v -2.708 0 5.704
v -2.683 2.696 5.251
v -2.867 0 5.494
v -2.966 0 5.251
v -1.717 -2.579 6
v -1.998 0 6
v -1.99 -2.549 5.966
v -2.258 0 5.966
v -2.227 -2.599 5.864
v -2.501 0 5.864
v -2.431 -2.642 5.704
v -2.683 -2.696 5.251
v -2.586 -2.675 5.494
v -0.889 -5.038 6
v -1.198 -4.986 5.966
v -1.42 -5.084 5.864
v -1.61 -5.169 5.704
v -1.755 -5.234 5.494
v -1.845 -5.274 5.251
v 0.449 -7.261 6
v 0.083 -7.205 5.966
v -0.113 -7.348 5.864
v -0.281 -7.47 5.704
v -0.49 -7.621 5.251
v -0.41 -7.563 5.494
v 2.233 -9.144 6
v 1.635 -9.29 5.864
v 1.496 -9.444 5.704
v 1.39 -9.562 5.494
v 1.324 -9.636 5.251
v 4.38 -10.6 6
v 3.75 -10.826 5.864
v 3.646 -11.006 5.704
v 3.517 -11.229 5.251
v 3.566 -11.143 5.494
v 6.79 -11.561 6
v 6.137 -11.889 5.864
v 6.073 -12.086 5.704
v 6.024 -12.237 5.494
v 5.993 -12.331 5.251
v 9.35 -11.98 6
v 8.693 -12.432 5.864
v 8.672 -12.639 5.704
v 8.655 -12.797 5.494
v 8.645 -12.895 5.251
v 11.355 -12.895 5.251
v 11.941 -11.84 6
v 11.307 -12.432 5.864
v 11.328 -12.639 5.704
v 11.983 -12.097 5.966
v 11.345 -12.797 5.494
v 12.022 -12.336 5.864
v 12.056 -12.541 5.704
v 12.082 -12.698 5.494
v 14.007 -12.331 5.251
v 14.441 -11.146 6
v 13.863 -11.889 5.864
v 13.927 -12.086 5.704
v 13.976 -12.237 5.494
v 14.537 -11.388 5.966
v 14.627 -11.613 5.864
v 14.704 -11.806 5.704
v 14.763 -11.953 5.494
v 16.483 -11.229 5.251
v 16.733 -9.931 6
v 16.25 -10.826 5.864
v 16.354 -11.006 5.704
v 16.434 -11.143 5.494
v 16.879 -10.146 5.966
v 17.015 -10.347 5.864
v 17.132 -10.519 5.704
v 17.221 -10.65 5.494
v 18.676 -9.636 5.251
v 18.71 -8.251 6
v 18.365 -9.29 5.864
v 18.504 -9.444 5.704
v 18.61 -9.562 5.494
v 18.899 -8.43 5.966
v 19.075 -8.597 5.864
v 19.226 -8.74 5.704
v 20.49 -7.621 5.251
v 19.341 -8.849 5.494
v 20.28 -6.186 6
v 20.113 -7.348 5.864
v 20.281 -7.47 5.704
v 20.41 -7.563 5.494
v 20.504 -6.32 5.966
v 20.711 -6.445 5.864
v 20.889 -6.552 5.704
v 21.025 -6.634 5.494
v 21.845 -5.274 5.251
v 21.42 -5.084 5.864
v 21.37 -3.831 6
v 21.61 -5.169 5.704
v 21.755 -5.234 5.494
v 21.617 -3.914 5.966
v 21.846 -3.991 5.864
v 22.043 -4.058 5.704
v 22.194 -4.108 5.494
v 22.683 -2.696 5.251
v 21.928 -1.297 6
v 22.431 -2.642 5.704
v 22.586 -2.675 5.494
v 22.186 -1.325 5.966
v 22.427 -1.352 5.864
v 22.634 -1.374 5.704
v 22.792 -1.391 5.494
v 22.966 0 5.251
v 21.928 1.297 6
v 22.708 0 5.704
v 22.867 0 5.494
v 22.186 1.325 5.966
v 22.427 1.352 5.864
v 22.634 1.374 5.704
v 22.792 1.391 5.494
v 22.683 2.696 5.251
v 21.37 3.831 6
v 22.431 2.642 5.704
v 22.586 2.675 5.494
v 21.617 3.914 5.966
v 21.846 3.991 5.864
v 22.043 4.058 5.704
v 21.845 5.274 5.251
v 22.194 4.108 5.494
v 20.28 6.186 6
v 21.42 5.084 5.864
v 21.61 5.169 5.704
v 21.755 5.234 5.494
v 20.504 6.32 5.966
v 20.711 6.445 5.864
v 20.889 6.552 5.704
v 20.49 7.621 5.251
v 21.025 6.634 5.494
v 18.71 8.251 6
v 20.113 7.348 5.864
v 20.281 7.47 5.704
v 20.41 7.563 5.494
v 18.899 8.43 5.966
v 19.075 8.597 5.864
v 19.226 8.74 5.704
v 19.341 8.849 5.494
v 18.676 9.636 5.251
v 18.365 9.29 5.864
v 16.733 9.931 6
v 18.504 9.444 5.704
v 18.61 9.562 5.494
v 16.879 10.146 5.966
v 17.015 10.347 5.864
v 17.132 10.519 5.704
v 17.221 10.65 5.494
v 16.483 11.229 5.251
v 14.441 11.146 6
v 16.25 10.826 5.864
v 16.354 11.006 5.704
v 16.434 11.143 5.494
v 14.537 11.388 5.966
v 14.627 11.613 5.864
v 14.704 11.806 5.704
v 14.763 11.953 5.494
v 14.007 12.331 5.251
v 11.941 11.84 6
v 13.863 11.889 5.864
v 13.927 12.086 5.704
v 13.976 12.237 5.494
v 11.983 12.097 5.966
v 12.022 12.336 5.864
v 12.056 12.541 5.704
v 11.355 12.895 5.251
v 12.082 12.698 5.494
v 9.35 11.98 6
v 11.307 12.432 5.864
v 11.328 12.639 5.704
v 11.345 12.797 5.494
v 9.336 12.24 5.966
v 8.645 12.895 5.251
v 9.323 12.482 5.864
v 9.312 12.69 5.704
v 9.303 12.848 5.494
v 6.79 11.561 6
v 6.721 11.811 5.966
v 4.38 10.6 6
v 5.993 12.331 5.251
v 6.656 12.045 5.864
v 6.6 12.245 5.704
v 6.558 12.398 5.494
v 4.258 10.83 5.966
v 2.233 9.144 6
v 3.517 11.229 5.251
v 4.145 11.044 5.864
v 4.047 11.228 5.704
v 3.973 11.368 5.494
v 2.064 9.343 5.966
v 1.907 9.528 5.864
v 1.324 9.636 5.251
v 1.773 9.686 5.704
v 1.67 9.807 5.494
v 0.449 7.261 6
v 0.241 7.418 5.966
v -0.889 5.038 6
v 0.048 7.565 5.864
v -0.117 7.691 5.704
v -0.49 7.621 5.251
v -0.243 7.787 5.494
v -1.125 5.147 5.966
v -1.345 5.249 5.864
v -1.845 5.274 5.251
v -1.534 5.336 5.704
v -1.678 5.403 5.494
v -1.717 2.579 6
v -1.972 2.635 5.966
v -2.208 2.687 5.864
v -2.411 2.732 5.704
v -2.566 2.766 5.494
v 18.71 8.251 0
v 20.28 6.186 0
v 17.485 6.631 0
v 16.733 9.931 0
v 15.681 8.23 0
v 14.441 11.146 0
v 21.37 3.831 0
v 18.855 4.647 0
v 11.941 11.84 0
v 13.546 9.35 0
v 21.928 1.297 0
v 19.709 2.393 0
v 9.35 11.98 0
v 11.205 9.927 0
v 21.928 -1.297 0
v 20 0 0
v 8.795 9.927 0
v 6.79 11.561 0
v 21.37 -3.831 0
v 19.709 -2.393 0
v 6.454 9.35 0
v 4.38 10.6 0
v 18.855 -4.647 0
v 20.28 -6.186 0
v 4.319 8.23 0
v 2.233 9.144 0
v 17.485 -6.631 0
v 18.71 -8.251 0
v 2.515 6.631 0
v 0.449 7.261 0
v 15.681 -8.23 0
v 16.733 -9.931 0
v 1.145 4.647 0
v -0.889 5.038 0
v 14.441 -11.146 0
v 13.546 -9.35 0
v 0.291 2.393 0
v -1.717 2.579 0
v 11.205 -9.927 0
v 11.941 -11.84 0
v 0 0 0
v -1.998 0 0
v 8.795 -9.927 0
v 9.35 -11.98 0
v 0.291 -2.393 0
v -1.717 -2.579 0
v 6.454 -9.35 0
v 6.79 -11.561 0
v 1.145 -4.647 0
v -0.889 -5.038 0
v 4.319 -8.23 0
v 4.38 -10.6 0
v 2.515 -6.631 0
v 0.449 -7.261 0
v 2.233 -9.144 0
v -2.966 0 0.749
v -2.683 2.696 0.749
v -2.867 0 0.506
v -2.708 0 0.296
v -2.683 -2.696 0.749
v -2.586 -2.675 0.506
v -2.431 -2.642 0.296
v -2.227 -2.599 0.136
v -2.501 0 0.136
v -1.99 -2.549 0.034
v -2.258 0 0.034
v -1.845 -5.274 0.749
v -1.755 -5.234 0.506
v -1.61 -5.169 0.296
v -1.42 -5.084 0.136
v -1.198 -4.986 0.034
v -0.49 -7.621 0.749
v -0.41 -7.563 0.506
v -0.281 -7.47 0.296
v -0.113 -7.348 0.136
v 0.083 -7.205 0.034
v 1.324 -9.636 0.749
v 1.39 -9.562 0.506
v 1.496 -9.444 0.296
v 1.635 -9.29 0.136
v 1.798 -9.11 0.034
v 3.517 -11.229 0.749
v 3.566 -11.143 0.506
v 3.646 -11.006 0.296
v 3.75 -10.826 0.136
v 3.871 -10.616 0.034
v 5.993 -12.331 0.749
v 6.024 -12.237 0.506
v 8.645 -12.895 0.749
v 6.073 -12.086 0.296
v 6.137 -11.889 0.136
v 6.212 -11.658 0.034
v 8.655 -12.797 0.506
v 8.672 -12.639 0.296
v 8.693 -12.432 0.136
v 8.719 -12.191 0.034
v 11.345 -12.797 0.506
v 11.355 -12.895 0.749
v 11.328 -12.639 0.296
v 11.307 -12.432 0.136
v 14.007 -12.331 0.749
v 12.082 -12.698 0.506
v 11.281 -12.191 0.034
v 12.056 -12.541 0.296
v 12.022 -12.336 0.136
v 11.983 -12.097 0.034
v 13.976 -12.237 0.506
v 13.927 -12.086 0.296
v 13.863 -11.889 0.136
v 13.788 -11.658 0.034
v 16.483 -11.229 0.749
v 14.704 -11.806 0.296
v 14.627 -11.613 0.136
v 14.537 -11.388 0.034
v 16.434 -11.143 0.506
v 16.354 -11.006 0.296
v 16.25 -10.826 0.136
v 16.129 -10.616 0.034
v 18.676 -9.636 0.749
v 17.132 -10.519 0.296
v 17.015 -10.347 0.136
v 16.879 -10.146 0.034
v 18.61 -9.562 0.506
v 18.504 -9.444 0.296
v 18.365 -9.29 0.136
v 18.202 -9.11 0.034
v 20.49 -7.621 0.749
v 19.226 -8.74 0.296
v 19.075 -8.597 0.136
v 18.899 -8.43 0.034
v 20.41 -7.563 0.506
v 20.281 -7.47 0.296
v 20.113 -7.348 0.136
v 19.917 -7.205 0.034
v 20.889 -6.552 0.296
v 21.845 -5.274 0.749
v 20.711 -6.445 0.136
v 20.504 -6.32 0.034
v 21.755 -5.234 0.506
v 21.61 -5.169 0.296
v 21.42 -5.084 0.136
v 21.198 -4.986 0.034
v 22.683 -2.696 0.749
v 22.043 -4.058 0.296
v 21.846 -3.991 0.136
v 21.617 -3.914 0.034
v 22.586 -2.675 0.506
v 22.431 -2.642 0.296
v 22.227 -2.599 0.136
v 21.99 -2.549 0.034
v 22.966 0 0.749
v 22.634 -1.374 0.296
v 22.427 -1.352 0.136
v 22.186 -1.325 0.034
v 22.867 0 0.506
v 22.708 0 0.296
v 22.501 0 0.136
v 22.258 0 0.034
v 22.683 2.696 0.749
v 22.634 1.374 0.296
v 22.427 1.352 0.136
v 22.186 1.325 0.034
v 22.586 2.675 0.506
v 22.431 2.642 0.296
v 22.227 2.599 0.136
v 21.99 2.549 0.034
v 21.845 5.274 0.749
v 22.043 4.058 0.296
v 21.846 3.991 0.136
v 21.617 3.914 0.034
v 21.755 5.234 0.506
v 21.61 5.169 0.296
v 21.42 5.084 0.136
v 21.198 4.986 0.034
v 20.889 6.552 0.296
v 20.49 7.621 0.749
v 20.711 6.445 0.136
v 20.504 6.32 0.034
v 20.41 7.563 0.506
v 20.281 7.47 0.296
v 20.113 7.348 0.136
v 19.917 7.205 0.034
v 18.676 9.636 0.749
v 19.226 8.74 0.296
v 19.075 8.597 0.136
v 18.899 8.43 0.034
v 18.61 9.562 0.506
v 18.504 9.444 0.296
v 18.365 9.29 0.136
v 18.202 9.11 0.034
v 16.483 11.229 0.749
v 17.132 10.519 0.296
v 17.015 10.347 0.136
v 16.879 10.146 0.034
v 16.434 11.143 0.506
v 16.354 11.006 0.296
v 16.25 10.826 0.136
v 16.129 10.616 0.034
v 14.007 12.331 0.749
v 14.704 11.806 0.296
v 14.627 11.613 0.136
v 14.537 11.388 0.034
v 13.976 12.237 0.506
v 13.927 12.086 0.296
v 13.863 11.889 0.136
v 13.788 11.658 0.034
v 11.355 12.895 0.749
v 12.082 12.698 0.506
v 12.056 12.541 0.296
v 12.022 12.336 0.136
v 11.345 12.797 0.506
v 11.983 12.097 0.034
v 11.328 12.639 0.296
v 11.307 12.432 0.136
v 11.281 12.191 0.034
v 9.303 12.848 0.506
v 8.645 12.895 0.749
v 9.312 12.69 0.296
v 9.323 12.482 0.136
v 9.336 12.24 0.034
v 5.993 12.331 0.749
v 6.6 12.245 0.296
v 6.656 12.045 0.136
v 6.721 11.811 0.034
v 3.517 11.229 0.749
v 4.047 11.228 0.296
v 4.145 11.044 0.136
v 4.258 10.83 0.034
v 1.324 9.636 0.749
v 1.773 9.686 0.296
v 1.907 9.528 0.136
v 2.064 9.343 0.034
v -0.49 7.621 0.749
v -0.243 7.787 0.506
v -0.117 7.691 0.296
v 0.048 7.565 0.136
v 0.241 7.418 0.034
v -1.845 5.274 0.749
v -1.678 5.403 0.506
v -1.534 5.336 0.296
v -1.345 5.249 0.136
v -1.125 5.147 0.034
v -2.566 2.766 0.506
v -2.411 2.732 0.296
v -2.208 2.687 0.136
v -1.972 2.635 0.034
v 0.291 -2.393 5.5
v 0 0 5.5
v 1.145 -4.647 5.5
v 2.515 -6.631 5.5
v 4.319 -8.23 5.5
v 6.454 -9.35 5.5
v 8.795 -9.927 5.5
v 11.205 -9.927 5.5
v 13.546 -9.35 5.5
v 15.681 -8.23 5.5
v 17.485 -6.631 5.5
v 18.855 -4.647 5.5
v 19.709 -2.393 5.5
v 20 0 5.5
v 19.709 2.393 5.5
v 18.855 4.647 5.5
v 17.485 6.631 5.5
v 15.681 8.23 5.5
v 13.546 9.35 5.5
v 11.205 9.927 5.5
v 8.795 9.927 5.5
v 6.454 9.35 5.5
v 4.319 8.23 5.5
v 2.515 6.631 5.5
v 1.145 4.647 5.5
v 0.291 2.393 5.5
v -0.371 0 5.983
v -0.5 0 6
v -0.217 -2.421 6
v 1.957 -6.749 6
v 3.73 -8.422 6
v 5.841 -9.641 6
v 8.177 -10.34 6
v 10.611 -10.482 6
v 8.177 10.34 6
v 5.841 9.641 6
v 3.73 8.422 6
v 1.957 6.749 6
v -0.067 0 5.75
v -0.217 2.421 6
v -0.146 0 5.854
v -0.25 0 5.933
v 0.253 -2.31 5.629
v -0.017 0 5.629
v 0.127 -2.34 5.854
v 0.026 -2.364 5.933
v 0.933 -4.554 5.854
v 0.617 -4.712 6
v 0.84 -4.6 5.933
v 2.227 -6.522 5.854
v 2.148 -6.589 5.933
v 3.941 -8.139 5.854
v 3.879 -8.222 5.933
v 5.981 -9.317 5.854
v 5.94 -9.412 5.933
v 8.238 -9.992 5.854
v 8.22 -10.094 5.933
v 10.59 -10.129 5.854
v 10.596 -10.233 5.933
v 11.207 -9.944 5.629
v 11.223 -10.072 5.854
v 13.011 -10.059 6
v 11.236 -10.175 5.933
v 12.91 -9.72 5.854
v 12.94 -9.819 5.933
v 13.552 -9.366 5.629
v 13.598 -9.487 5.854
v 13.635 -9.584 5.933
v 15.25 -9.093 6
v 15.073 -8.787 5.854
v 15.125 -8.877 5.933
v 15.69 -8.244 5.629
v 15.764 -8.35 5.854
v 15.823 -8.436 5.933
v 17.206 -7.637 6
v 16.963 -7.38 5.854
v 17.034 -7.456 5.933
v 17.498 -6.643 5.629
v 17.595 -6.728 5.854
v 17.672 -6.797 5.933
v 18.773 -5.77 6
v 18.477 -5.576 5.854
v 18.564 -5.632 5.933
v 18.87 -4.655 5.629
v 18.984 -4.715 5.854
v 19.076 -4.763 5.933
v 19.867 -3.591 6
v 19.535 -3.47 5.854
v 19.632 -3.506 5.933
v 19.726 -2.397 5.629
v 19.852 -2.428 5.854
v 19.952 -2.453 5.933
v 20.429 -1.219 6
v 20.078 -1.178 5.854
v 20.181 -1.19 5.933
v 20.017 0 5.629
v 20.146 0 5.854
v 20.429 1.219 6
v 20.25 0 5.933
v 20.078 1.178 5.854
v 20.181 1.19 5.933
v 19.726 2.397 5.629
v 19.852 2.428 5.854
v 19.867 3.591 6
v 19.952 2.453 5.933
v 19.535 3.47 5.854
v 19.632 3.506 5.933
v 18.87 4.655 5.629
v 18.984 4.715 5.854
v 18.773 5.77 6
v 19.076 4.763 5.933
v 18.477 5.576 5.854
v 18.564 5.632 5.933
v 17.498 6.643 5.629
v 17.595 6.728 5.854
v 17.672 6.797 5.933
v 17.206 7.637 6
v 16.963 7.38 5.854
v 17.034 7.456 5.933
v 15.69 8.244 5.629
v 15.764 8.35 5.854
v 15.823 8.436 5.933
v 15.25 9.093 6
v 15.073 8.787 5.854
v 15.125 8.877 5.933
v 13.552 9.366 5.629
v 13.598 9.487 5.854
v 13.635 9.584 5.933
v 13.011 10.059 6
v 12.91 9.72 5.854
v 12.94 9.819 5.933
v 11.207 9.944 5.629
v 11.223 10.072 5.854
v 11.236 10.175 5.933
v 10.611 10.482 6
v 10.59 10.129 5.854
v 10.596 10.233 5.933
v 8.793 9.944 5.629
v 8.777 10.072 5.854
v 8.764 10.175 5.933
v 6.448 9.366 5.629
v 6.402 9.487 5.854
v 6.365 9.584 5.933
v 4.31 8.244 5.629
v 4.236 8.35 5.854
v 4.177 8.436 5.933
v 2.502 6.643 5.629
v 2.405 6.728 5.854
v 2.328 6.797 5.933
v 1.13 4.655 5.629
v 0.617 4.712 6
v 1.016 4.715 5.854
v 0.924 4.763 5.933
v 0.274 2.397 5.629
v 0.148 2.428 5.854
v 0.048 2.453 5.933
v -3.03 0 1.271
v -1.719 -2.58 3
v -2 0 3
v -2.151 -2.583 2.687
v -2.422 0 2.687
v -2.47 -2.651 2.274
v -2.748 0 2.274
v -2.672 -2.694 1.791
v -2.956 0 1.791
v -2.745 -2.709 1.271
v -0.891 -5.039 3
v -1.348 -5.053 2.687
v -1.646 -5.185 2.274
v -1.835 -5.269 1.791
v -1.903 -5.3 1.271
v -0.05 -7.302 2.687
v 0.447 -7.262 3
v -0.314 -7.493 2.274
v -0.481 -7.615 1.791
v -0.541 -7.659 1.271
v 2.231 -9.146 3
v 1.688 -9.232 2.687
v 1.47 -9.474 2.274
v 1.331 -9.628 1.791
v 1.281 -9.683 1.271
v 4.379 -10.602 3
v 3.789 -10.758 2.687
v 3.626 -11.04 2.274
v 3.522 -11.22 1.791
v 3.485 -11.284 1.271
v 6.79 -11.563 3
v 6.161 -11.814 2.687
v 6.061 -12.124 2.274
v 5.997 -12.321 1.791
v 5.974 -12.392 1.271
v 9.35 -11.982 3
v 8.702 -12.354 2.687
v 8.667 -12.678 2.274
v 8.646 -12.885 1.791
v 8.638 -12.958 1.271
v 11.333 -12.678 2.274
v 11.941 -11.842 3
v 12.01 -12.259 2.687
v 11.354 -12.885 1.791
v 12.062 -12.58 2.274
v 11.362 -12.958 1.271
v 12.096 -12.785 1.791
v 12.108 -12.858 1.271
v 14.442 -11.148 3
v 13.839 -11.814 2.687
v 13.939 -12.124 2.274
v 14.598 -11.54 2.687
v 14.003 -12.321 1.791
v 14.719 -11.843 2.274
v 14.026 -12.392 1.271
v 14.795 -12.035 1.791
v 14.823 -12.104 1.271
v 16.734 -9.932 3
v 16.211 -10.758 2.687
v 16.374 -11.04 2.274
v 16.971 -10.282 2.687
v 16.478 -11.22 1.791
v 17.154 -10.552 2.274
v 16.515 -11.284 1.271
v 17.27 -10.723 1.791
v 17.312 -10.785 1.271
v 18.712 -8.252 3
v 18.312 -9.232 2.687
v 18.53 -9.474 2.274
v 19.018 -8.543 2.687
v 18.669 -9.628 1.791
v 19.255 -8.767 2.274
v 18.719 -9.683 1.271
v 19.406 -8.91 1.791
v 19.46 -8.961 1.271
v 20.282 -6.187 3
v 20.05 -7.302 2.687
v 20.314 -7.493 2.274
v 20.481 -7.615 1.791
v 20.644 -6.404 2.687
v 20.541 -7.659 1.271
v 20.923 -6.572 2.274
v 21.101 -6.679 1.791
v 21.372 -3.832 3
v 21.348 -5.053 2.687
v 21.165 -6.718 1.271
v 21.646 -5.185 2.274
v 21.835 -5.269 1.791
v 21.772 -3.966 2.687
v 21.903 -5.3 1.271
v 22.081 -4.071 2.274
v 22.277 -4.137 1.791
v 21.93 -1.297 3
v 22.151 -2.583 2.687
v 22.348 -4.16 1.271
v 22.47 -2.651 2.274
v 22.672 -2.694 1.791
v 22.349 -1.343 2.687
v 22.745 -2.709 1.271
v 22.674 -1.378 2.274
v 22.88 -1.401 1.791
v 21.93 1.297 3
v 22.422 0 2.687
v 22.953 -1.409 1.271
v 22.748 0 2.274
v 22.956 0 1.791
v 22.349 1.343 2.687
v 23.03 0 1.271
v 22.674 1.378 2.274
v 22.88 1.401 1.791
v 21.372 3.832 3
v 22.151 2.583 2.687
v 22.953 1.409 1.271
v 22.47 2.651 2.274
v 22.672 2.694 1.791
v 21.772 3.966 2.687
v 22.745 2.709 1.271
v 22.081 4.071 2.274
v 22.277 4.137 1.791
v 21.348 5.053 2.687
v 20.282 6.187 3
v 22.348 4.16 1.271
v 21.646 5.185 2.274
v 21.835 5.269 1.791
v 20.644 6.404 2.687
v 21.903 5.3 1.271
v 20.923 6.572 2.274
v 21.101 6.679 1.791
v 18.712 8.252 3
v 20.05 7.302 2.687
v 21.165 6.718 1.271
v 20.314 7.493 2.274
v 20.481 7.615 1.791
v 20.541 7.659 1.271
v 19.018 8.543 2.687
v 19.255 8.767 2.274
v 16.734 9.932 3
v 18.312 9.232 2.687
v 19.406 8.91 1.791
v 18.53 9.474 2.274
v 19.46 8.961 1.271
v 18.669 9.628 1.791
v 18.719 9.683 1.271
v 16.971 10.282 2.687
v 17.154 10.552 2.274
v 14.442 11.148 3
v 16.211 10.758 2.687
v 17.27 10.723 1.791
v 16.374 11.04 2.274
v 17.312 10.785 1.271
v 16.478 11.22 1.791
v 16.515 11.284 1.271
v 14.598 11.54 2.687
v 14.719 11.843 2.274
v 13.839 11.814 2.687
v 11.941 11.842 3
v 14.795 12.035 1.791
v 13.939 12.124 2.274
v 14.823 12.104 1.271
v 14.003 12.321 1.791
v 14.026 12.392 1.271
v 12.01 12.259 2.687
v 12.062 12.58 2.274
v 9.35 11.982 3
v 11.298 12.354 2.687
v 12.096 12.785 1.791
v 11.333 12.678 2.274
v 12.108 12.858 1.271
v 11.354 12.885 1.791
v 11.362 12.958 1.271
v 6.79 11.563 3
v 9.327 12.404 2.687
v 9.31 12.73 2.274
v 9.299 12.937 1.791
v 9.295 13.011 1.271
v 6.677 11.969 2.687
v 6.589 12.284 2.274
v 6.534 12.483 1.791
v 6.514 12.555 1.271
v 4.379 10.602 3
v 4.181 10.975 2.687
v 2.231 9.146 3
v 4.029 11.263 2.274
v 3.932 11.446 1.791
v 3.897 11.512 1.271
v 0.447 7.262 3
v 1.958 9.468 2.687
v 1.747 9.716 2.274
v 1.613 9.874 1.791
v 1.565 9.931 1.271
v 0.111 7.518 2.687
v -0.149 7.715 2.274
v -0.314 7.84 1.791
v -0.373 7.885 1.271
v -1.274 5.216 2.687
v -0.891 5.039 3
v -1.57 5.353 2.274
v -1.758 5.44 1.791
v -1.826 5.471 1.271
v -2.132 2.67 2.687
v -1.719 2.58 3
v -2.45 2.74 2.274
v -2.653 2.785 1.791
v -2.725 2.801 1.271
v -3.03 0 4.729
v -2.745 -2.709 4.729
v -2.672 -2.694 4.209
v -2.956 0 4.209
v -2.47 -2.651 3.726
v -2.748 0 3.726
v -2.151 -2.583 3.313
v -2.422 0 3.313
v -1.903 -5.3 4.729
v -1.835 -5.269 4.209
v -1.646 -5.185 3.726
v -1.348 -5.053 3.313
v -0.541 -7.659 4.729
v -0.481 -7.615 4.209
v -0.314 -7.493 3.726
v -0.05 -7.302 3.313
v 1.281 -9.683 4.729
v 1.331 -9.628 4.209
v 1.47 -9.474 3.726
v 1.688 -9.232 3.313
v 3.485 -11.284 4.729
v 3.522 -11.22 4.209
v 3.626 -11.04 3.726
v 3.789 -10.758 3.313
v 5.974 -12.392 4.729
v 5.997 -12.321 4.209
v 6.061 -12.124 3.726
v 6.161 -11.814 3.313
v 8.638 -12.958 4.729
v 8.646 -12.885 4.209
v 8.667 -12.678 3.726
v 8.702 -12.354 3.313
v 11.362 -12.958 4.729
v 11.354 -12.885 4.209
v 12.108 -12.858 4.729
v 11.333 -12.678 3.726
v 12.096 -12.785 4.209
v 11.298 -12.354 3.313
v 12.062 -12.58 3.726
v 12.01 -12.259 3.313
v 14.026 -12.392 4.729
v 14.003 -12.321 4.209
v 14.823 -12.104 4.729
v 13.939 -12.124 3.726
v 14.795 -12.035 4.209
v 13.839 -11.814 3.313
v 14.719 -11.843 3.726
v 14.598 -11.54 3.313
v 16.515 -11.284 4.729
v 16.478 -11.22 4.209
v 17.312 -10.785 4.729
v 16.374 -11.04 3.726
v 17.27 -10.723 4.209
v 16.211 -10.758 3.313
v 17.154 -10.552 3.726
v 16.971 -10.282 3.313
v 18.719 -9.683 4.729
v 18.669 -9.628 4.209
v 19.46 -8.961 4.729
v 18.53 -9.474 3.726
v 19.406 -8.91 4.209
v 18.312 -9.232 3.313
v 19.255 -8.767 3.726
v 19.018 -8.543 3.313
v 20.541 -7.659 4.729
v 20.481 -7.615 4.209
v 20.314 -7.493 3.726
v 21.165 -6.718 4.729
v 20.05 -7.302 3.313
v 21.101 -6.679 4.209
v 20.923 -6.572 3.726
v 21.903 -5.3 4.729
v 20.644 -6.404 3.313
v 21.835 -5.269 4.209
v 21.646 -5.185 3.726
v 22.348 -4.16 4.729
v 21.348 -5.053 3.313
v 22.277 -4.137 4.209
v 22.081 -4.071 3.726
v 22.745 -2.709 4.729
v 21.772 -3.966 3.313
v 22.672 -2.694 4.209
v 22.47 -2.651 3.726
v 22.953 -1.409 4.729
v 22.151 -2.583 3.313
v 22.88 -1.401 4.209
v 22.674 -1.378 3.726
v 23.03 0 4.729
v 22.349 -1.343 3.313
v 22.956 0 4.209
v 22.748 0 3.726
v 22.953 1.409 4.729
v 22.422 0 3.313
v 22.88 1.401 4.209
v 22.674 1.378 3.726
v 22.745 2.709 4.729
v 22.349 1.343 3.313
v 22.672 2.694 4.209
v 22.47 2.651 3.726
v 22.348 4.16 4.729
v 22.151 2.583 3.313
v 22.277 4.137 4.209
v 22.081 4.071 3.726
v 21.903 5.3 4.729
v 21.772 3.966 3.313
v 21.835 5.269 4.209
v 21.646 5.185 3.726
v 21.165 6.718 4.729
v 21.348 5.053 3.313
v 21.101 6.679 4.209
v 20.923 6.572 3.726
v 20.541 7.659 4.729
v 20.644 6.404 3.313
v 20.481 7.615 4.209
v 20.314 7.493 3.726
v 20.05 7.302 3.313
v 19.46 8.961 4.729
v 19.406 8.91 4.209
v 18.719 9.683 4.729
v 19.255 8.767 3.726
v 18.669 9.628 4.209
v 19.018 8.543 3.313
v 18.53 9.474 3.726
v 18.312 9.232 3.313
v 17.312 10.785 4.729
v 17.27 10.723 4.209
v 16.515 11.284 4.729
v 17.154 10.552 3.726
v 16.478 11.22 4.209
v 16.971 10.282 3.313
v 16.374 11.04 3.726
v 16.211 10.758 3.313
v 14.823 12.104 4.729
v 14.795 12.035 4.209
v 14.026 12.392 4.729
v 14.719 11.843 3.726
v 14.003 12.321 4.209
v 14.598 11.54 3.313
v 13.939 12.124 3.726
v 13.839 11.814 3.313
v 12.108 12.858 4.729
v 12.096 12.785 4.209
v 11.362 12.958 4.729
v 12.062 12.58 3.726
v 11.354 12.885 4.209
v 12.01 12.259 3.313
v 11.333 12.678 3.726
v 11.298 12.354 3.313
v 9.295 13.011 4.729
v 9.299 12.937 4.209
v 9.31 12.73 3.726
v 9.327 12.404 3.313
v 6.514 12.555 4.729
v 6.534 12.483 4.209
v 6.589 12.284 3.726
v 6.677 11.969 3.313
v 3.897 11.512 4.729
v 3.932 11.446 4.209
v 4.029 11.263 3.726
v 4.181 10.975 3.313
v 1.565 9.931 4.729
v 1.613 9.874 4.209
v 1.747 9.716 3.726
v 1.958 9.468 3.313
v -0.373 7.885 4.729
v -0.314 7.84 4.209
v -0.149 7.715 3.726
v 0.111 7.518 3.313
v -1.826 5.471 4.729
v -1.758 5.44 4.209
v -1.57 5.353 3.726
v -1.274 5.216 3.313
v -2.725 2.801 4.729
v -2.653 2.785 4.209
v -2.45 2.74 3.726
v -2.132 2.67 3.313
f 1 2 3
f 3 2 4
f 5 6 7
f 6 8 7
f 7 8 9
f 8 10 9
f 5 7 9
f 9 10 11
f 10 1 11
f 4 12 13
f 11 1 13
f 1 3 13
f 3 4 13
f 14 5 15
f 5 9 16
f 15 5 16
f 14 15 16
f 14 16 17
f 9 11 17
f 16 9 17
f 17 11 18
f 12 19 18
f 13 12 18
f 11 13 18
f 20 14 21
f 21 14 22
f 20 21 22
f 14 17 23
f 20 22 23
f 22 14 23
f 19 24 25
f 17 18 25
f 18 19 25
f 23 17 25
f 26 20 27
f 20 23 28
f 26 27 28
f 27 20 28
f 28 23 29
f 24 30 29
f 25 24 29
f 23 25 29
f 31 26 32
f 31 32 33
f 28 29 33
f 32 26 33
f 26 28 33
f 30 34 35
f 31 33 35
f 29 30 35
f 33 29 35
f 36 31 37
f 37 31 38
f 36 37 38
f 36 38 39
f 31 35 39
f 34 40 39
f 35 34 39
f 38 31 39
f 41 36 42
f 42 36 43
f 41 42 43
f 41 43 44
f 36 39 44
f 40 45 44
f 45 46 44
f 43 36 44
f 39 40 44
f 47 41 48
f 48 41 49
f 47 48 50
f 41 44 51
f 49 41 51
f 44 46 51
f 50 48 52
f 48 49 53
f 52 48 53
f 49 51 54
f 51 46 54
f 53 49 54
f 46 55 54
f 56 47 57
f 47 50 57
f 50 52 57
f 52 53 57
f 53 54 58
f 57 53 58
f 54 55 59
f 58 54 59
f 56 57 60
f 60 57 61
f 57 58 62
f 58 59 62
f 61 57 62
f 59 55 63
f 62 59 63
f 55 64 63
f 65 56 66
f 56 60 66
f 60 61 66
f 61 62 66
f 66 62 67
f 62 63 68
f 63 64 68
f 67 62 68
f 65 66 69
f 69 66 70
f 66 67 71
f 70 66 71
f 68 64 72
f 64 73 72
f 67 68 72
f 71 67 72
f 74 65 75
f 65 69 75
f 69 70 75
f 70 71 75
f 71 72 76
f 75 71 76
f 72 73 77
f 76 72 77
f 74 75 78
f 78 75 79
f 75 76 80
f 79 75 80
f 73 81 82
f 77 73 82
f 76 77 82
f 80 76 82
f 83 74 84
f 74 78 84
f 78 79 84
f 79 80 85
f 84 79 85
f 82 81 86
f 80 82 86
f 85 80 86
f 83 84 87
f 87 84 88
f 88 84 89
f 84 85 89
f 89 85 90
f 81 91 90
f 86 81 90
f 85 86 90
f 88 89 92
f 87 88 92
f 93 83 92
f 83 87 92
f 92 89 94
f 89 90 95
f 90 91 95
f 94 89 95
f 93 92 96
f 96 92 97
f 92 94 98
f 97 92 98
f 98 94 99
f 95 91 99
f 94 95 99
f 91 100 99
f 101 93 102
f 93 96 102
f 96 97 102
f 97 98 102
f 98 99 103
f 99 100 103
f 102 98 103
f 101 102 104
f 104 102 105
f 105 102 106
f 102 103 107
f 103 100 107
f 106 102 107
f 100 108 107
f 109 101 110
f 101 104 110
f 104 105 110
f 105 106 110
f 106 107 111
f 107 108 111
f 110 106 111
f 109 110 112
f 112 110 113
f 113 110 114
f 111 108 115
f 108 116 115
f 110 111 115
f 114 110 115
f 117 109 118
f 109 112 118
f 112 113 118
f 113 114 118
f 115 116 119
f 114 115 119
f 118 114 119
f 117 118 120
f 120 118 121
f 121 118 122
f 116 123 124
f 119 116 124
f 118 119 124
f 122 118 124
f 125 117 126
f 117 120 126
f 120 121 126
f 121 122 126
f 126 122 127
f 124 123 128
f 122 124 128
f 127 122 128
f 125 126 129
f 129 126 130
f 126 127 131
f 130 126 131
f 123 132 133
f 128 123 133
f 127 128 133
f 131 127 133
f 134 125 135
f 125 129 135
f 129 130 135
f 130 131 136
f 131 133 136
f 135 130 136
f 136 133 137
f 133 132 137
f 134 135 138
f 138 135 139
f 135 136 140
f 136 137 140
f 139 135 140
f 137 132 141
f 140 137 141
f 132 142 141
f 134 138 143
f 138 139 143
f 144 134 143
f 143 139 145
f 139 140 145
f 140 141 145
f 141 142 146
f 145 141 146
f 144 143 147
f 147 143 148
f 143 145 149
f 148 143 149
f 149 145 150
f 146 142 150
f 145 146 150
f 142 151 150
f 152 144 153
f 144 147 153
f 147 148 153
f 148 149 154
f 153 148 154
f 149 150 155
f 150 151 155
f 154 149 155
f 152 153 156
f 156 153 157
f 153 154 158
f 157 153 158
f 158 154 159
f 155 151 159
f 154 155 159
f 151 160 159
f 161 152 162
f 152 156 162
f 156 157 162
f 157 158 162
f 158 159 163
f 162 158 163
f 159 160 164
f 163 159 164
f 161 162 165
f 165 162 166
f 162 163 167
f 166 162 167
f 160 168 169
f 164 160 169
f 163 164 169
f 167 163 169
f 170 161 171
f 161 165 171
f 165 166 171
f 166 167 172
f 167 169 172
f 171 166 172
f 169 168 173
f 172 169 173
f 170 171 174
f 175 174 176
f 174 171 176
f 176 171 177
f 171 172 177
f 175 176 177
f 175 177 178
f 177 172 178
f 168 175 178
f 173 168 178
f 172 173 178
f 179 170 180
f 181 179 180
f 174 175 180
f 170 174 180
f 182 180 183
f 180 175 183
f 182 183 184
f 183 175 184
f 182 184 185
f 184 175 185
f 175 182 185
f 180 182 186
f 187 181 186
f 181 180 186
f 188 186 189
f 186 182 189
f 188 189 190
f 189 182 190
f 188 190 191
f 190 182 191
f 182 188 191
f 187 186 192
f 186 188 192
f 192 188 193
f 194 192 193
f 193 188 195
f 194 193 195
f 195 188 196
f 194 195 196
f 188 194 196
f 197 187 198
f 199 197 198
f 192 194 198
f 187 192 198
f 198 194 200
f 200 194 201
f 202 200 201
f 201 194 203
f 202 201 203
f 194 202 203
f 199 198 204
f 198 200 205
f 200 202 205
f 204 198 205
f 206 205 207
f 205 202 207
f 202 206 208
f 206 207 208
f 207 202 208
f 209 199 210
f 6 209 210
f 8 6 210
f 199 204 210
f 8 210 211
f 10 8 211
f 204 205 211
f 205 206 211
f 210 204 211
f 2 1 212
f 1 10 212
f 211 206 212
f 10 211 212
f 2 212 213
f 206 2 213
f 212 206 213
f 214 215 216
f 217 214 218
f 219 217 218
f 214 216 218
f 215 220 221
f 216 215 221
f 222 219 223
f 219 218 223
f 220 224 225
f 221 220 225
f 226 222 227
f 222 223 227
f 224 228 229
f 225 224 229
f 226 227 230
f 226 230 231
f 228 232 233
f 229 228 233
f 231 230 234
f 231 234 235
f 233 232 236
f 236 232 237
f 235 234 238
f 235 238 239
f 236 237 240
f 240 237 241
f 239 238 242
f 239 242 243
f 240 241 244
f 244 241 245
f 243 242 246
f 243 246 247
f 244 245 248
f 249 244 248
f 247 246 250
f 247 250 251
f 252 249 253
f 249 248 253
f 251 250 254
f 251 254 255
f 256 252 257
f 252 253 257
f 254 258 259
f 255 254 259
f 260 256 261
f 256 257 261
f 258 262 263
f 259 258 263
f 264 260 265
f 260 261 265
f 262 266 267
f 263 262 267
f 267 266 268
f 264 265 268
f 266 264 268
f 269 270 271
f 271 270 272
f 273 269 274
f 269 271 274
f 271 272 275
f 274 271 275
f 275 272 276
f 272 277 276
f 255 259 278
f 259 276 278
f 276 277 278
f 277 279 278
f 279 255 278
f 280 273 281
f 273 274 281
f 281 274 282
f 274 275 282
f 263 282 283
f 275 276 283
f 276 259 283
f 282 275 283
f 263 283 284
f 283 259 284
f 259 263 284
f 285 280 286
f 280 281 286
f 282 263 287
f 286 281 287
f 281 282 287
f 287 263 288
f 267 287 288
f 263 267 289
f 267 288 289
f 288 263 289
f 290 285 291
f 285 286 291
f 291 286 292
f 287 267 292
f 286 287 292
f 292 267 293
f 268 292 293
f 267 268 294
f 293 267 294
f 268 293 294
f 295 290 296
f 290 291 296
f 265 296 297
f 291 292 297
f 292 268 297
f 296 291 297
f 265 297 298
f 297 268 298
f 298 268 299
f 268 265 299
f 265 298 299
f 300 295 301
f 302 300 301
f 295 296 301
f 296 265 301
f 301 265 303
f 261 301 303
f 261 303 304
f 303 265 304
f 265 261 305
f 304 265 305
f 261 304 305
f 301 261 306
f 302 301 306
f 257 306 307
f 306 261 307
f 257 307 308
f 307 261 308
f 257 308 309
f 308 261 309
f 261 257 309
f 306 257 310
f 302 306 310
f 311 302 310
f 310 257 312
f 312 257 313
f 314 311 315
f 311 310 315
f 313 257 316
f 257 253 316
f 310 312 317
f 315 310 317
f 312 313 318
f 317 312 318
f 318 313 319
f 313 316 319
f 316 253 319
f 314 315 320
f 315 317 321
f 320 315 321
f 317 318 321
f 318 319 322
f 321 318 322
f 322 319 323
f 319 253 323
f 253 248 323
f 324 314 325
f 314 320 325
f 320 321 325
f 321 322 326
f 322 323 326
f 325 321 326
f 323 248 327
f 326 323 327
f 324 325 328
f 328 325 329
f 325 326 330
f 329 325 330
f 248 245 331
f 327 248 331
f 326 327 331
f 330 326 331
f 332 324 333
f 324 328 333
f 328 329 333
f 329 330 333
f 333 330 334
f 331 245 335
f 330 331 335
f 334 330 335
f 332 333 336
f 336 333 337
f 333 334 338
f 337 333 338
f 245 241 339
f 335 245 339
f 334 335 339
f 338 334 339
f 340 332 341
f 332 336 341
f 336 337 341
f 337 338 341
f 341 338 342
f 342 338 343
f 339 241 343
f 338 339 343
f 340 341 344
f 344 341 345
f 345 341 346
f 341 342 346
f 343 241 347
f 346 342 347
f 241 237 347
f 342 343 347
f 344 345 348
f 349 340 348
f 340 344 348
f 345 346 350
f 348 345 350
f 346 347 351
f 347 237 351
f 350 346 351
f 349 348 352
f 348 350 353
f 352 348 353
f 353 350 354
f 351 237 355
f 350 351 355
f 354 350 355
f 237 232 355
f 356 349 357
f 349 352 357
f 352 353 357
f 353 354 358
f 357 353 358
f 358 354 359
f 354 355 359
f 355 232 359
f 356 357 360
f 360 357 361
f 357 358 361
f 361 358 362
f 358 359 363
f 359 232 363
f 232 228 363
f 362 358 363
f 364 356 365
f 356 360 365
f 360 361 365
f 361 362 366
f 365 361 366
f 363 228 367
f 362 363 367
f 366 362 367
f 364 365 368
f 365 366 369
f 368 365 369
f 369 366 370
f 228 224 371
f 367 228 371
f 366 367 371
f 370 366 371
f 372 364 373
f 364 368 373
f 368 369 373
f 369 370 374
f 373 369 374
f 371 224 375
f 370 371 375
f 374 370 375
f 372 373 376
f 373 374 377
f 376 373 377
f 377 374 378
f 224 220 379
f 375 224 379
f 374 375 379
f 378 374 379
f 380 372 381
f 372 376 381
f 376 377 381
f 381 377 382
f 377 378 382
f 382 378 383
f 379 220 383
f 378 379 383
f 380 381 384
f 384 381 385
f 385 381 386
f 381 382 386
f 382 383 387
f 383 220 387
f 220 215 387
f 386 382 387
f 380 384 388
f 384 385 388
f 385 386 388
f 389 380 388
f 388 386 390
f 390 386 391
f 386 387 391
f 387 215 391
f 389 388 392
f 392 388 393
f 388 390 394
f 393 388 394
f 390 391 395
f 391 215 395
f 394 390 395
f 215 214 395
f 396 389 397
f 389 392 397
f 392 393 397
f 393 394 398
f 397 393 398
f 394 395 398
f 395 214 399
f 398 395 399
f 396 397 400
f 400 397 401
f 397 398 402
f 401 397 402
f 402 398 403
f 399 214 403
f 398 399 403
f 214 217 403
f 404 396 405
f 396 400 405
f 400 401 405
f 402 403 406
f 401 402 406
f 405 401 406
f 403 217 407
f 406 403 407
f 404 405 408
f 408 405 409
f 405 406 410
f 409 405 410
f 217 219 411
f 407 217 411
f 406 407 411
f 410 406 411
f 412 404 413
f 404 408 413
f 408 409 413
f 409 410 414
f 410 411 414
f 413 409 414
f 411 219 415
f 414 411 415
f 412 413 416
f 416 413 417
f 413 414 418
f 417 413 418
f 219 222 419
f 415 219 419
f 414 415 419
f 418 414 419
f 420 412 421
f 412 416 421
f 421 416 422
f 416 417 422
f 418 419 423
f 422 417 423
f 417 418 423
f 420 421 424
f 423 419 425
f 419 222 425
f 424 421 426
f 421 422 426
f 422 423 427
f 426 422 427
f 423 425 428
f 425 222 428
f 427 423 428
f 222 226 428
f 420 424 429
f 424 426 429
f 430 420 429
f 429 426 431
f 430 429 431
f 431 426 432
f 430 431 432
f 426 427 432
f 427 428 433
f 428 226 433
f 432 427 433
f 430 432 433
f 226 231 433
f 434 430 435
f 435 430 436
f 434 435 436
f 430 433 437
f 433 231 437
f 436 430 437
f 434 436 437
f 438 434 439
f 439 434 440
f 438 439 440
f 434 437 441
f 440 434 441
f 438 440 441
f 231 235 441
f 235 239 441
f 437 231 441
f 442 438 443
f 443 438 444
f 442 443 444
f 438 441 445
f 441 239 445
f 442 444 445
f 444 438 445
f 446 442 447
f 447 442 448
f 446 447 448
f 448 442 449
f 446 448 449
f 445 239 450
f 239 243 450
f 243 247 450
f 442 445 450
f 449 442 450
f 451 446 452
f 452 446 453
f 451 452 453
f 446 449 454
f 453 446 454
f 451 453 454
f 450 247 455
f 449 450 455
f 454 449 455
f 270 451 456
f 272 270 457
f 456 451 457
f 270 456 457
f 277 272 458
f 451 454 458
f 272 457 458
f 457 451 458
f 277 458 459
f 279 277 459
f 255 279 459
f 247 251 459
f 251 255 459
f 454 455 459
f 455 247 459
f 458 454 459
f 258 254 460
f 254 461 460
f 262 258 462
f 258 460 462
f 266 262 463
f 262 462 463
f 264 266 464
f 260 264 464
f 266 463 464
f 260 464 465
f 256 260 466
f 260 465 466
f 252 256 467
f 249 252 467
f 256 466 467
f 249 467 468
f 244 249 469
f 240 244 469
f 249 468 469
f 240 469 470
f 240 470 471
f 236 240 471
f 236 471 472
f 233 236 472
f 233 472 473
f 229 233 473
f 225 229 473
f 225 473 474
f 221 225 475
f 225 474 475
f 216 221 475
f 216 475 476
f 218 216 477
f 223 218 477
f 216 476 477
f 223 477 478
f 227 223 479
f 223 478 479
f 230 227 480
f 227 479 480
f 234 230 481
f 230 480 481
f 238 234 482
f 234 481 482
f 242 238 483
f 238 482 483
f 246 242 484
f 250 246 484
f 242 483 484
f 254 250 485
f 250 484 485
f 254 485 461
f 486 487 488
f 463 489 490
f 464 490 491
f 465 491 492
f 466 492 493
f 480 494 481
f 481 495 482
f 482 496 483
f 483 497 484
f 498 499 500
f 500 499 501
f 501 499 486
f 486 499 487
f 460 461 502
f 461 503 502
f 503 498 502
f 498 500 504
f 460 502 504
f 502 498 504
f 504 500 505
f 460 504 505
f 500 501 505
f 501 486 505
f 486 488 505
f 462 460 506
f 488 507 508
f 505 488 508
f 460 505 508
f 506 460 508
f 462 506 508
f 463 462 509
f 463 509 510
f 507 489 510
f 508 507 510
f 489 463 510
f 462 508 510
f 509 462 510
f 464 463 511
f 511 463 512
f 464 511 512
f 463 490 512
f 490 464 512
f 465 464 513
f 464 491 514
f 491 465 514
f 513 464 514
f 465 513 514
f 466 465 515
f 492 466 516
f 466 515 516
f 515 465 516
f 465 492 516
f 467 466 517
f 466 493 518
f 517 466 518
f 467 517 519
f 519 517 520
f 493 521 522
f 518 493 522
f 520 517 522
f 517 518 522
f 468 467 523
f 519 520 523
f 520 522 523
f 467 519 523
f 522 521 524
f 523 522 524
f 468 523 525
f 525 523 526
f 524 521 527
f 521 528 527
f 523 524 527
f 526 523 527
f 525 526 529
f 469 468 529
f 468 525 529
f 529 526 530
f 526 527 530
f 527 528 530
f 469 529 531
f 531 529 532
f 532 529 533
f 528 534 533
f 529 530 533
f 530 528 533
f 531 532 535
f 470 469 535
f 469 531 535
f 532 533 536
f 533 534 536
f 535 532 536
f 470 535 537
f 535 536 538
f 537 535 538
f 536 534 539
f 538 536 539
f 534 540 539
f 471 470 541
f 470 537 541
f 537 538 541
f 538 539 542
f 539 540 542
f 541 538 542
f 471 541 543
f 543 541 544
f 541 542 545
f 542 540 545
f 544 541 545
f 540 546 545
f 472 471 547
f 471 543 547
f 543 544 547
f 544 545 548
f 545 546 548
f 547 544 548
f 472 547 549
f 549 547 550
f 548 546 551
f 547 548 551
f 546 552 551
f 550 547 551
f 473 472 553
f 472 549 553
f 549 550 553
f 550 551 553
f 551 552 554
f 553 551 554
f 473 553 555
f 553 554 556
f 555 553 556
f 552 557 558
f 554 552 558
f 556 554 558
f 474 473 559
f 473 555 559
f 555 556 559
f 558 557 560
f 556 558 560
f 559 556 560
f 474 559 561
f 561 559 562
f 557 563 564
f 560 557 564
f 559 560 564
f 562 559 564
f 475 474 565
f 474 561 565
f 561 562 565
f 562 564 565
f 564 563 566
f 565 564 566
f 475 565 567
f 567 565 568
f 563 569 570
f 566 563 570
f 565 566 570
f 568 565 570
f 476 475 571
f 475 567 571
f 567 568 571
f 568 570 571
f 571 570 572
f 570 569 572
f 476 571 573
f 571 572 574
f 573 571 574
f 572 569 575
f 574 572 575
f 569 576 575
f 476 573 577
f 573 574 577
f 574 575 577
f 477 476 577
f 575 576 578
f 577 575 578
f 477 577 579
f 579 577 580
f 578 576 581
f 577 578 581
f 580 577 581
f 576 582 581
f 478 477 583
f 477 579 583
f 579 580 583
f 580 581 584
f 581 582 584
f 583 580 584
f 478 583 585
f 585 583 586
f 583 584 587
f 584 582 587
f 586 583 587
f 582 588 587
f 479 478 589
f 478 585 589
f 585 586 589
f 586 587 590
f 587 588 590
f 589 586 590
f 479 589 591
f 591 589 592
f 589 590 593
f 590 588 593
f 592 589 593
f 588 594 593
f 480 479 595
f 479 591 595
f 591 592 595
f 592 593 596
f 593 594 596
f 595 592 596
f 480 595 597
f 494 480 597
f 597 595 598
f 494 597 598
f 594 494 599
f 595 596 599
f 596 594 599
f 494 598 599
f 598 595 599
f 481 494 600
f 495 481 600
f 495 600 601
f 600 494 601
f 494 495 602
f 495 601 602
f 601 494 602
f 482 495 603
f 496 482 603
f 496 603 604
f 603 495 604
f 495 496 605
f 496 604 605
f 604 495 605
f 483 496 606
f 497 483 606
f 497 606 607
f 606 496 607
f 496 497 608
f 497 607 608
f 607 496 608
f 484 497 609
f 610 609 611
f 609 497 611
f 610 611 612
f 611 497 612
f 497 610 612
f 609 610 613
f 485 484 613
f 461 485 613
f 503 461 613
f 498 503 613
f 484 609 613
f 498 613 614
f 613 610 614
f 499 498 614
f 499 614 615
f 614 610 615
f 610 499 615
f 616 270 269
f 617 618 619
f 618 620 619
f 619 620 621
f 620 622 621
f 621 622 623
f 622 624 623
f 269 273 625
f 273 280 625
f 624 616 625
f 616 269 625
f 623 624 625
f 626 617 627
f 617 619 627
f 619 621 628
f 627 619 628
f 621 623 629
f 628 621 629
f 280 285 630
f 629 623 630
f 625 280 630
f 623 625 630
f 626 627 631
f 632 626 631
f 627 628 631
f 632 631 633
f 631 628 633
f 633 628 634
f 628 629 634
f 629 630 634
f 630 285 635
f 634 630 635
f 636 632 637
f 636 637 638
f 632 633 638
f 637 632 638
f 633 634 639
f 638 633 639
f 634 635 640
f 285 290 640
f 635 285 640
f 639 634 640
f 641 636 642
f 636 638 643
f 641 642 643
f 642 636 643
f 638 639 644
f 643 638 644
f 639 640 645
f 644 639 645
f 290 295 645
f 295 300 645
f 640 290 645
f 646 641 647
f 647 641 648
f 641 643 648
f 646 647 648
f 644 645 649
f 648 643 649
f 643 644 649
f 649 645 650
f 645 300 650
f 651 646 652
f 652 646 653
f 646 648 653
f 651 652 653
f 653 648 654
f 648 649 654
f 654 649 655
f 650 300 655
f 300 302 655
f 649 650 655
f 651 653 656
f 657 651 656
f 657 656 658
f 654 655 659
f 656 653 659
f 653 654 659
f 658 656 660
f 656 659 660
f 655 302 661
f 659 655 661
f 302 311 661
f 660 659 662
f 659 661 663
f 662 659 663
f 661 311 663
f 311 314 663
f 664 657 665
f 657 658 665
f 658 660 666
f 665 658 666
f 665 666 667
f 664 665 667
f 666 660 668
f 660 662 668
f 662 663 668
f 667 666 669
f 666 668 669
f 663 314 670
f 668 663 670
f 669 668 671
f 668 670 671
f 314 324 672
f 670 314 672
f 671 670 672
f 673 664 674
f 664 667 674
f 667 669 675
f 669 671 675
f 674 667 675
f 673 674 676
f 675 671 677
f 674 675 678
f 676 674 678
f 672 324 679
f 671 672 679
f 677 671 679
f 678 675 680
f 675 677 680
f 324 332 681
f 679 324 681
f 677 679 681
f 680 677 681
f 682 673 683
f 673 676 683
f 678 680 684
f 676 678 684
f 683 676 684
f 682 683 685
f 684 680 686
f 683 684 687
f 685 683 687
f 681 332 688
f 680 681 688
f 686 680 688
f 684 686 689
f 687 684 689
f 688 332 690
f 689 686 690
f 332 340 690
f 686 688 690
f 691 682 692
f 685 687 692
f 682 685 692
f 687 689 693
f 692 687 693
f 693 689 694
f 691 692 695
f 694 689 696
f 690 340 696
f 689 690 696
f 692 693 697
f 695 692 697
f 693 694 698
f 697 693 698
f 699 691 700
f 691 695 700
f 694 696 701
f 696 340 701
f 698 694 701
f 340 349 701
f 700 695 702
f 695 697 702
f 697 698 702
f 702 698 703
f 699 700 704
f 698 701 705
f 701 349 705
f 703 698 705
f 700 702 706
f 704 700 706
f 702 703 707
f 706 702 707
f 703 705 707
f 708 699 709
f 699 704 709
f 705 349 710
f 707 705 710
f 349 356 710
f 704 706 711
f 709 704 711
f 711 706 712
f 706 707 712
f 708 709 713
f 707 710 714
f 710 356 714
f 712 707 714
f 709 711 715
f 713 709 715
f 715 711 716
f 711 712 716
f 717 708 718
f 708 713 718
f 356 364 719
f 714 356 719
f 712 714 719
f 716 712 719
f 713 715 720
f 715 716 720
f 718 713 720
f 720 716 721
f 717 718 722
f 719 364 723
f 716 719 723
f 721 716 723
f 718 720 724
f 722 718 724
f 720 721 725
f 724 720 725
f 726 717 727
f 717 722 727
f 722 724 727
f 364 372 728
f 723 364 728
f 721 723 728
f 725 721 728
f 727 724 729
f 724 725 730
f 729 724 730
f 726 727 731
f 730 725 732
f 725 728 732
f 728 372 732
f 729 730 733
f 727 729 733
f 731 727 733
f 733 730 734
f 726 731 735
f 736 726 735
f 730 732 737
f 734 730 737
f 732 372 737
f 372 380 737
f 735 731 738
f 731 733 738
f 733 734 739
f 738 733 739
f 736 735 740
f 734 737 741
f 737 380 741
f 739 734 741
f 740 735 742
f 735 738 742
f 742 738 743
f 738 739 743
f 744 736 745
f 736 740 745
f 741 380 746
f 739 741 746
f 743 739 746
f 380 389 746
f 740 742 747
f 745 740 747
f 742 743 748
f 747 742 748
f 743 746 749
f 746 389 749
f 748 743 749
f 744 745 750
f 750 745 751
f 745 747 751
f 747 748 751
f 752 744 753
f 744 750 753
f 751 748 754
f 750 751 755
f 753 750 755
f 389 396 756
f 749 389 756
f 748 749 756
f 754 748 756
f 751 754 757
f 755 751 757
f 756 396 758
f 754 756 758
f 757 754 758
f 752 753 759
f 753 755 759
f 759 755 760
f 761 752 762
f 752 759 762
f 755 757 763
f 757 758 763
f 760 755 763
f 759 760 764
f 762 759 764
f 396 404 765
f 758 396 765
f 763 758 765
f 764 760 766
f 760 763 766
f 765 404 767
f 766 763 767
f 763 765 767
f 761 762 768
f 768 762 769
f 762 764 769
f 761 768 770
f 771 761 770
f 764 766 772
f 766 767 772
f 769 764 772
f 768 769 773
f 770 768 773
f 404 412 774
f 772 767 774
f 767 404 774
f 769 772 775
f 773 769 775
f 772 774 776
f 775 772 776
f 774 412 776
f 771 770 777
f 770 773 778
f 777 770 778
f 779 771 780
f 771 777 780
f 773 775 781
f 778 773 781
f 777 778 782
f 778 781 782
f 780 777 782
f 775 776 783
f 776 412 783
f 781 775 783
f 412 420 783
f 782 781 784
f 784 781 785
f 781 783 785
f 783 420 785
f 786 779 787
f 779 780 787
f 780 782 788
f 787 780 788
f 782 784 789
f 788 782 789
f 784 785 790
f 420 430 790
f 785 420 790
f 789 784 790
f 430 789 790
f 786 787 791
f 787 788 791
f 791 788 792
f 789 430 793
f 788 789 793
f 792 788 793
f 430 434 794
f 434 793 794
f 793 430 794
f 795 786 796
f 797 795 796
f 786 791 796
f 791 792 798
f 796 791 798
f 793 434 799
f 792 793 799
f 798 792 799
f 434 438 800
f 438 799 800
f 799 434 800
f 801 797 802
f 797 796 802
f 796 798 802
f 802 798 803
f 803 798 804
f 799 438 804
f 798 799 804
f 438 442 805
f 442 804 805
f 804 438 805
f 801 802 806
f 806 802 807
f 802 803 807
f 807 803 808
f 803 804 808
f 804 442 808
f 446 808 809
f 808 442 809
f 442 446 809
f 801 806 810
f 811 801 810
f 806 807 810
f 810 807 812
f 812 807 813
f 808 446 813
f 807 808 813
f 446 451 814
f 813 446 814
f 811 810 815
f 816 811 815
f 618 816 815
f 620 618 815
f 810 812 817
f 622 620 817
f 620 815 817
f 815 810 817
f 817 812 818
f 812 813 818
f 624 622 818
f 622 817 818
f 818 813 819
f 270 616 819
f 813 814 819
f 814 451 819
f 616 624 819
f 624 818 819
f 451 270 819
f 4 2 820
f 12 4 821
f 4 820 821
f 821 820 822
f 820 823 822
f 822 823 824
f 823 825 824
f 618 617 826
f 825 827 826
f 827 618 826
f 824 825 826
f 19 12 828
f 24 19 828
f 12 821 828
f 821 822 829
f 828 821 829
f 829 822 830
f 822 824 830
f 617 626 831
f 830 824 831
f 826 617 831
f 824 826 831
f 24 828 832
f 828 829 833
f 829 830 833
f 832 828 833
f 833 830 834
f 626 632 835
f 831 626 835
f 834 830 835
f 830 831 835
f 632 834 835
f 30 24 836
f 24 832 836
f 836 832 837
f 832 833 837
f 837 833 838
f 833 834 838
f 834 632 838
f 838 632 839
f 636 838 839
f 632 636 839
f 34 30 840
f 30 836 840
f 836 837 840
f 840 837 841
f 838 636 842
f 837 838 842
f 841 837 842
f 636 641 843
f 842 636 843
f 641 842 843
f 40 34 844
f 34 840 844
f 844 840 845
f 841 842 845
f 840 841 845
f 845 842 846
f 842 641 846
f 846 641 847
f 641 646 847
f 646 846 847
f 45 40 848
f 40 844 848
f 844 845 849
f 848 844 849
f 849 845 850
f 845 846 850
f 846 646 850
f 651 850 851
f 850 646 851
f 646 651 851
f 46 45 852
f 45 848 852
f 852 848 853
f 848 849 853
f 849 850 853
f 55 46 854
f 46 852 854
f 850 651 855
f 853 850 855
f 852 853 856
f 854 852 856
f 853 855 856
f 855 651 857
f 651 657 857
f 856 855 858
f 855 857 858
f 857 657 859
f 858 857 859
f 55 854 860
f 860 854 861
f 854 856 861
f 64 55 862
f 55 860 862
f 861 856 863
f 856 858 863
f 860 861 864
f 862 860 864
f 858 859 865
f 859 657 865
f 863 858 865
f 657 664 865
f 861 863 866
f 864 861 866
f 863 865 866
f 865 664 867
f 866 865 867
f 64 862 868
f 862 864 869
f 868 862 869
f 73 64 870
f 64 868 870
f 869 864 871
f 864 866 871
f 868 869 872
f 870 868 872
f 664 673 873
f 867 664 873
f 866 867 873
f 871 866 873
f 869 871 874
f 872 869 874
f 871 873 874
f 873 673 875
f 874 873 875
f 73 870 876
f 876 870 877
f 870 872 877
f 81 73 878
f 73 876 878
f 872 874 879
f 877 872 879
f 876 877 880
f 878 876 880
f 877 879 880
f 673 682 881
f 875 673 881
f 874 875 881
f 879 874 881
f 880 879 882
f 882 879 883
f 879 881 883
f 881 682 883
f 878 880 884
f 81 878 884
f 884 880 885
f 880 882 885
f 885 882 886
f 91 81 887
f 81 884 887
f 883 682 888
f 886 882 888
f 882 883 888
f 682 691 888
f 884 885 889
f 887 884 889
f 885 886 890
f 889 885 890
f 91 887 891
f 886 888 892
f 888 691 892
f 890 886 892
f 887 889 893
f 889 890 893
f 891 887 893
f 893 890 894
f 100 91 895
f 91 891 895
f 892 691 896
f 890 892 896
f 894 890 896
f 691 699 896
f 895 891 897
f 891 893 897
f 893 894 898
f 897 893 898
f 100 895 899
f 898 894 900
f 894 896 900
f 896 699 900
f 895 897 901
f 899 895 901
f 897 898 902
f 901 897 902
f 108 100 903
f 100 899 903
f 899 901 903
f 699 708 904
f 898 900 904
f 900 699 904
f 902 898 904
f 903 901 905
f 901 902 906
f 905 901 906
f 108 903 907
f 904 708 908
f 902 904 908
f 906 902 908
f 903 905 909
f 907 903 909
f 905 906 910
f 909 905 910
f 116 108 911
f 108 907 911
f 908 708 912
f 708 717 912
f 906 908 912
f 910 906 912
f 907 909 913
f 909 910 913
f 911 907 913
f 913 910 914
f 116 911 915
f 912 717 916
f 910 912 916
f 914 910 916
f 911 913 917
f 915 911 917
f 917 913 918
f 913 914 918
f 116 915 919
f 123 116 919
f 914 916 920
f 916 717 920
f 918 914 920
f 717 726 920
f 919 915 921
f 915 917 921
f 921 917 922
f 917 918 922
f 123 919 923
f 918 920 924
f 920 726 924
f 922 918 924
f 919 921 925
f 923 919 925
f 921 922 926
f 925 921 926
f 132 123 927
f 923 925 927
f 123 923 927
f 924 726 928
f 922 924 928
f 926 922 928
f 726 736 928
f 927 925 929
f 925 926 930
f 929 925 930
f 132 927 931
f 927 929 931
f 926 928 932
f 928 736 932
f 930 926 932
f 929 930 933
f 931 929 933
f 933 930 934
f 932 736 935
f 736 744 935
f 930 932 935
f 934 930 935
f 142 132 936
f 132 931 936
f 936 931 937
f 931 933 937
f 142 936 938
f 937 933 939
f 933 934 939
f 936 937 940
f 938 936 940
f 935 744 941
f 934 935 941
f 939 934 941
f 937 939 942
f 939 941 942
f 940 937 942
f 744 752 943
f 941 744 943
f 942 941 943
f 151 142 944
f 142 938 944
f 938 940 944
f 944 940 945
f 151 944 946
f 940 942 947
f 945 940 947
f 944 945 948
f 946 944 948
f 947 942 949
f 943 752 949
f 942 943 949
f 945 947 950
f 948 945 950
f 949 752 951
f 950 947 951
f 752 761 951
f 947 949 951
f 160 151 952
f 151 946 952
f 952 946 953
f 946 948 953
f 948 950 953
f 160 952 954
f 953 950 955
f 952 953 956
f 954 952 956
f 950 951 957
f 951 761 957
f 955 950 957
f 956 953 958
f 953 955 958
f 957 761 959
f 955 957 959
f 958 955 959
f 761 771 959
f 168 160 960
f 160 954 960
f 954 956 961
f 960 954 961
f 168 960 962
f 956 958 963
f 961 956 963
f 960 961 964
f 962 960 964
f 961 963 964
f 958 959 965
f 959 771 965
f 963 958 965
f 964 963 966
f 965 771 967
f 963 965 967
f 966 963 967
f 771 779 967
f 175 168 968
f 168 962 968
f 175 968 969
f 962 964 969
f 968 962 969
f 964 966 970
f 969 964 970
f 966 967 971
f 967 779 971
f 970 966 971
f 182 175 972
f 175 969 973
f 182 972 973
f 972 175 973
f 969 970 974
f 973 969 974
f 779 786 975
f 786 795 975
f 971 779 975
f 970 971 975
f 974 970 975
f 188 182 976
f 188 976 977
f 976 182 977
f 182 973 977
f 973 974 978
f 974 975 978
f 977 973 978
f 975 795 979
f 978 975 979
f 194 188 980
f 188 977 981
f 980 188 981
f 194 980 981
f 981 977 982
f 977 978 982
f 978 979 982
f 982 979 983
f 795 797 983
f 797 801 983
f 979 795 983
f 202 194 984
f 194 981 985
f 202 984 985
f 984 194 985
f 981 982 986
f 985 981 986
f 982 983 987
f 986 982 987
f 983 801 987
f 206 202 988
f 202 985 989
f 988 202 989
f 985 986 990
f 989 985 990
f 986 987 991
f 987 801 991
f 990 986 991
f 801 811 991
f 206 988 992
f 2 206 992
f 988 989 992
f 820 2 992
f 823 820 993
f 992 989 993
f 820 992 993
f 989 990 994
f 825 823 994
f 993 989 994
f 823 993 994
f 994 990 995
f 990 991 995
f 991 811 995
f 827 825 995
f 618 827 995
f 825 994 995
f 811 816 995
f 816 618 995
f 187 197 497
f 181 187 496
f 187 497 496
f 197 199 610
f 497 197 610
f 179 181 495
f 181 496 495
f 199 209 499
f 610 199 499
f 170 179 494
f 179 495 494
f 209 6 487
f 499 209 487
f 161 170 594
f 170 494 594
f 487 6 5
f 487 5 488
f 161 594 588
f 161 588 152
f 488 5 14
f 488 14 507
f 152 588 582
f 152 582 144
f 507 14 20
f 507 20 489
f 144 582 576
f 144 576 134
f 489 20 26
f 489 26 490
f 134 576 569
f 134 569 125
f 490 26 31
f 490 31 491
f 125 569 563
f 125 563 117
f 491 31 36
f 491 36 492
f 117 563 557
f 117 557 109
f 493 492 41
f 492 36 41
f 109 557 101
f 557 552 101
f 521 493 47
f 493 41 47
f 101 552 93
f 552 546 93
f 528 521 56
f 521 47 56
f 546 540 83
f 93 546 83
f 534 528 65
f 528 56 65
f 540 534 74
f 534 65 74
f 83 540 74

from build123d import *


with BuildPart() as f1:
    # F0 (on Front) → F1 (revolve)
    with BuildSketch(Plane.XZ):
        with BuildLine():
            Line((-1.997872, 0), (0, 0))
            Line((0, 0), (0, 3))
            Line((0, 3), (-2, 3))
            ThreePointArc((-2, 3), (-2.867851, 2.039645), (-2.965851, 0.748969))
            ThreePointArc((-2.965851, 0.748969), (-2.609824, 0.209105), (-1.997872, 0))
        make_face()
        with BuildLine():
            Line((-2, 3), (0, 3))
            Line((0, 3), (0, 5.5))
            ThreePointArc((0, 5.5), (-0.146447, 5.853553), (-0.5, 6))
            Line((-0.5, 6), (-1.997872, 6))
            ThreePointArc((-1.997872, 6), (-2.609824, 5.790895), (-2.965851, 5.251031))
            ThreePointArc((-2.965851, 5.251031), (-2.867851, 3.960355), (-2, 3))
        make_face()
    revolve(axis=Axis((10, 0, 3), (0, 0, 1)))


solid = f1.part
